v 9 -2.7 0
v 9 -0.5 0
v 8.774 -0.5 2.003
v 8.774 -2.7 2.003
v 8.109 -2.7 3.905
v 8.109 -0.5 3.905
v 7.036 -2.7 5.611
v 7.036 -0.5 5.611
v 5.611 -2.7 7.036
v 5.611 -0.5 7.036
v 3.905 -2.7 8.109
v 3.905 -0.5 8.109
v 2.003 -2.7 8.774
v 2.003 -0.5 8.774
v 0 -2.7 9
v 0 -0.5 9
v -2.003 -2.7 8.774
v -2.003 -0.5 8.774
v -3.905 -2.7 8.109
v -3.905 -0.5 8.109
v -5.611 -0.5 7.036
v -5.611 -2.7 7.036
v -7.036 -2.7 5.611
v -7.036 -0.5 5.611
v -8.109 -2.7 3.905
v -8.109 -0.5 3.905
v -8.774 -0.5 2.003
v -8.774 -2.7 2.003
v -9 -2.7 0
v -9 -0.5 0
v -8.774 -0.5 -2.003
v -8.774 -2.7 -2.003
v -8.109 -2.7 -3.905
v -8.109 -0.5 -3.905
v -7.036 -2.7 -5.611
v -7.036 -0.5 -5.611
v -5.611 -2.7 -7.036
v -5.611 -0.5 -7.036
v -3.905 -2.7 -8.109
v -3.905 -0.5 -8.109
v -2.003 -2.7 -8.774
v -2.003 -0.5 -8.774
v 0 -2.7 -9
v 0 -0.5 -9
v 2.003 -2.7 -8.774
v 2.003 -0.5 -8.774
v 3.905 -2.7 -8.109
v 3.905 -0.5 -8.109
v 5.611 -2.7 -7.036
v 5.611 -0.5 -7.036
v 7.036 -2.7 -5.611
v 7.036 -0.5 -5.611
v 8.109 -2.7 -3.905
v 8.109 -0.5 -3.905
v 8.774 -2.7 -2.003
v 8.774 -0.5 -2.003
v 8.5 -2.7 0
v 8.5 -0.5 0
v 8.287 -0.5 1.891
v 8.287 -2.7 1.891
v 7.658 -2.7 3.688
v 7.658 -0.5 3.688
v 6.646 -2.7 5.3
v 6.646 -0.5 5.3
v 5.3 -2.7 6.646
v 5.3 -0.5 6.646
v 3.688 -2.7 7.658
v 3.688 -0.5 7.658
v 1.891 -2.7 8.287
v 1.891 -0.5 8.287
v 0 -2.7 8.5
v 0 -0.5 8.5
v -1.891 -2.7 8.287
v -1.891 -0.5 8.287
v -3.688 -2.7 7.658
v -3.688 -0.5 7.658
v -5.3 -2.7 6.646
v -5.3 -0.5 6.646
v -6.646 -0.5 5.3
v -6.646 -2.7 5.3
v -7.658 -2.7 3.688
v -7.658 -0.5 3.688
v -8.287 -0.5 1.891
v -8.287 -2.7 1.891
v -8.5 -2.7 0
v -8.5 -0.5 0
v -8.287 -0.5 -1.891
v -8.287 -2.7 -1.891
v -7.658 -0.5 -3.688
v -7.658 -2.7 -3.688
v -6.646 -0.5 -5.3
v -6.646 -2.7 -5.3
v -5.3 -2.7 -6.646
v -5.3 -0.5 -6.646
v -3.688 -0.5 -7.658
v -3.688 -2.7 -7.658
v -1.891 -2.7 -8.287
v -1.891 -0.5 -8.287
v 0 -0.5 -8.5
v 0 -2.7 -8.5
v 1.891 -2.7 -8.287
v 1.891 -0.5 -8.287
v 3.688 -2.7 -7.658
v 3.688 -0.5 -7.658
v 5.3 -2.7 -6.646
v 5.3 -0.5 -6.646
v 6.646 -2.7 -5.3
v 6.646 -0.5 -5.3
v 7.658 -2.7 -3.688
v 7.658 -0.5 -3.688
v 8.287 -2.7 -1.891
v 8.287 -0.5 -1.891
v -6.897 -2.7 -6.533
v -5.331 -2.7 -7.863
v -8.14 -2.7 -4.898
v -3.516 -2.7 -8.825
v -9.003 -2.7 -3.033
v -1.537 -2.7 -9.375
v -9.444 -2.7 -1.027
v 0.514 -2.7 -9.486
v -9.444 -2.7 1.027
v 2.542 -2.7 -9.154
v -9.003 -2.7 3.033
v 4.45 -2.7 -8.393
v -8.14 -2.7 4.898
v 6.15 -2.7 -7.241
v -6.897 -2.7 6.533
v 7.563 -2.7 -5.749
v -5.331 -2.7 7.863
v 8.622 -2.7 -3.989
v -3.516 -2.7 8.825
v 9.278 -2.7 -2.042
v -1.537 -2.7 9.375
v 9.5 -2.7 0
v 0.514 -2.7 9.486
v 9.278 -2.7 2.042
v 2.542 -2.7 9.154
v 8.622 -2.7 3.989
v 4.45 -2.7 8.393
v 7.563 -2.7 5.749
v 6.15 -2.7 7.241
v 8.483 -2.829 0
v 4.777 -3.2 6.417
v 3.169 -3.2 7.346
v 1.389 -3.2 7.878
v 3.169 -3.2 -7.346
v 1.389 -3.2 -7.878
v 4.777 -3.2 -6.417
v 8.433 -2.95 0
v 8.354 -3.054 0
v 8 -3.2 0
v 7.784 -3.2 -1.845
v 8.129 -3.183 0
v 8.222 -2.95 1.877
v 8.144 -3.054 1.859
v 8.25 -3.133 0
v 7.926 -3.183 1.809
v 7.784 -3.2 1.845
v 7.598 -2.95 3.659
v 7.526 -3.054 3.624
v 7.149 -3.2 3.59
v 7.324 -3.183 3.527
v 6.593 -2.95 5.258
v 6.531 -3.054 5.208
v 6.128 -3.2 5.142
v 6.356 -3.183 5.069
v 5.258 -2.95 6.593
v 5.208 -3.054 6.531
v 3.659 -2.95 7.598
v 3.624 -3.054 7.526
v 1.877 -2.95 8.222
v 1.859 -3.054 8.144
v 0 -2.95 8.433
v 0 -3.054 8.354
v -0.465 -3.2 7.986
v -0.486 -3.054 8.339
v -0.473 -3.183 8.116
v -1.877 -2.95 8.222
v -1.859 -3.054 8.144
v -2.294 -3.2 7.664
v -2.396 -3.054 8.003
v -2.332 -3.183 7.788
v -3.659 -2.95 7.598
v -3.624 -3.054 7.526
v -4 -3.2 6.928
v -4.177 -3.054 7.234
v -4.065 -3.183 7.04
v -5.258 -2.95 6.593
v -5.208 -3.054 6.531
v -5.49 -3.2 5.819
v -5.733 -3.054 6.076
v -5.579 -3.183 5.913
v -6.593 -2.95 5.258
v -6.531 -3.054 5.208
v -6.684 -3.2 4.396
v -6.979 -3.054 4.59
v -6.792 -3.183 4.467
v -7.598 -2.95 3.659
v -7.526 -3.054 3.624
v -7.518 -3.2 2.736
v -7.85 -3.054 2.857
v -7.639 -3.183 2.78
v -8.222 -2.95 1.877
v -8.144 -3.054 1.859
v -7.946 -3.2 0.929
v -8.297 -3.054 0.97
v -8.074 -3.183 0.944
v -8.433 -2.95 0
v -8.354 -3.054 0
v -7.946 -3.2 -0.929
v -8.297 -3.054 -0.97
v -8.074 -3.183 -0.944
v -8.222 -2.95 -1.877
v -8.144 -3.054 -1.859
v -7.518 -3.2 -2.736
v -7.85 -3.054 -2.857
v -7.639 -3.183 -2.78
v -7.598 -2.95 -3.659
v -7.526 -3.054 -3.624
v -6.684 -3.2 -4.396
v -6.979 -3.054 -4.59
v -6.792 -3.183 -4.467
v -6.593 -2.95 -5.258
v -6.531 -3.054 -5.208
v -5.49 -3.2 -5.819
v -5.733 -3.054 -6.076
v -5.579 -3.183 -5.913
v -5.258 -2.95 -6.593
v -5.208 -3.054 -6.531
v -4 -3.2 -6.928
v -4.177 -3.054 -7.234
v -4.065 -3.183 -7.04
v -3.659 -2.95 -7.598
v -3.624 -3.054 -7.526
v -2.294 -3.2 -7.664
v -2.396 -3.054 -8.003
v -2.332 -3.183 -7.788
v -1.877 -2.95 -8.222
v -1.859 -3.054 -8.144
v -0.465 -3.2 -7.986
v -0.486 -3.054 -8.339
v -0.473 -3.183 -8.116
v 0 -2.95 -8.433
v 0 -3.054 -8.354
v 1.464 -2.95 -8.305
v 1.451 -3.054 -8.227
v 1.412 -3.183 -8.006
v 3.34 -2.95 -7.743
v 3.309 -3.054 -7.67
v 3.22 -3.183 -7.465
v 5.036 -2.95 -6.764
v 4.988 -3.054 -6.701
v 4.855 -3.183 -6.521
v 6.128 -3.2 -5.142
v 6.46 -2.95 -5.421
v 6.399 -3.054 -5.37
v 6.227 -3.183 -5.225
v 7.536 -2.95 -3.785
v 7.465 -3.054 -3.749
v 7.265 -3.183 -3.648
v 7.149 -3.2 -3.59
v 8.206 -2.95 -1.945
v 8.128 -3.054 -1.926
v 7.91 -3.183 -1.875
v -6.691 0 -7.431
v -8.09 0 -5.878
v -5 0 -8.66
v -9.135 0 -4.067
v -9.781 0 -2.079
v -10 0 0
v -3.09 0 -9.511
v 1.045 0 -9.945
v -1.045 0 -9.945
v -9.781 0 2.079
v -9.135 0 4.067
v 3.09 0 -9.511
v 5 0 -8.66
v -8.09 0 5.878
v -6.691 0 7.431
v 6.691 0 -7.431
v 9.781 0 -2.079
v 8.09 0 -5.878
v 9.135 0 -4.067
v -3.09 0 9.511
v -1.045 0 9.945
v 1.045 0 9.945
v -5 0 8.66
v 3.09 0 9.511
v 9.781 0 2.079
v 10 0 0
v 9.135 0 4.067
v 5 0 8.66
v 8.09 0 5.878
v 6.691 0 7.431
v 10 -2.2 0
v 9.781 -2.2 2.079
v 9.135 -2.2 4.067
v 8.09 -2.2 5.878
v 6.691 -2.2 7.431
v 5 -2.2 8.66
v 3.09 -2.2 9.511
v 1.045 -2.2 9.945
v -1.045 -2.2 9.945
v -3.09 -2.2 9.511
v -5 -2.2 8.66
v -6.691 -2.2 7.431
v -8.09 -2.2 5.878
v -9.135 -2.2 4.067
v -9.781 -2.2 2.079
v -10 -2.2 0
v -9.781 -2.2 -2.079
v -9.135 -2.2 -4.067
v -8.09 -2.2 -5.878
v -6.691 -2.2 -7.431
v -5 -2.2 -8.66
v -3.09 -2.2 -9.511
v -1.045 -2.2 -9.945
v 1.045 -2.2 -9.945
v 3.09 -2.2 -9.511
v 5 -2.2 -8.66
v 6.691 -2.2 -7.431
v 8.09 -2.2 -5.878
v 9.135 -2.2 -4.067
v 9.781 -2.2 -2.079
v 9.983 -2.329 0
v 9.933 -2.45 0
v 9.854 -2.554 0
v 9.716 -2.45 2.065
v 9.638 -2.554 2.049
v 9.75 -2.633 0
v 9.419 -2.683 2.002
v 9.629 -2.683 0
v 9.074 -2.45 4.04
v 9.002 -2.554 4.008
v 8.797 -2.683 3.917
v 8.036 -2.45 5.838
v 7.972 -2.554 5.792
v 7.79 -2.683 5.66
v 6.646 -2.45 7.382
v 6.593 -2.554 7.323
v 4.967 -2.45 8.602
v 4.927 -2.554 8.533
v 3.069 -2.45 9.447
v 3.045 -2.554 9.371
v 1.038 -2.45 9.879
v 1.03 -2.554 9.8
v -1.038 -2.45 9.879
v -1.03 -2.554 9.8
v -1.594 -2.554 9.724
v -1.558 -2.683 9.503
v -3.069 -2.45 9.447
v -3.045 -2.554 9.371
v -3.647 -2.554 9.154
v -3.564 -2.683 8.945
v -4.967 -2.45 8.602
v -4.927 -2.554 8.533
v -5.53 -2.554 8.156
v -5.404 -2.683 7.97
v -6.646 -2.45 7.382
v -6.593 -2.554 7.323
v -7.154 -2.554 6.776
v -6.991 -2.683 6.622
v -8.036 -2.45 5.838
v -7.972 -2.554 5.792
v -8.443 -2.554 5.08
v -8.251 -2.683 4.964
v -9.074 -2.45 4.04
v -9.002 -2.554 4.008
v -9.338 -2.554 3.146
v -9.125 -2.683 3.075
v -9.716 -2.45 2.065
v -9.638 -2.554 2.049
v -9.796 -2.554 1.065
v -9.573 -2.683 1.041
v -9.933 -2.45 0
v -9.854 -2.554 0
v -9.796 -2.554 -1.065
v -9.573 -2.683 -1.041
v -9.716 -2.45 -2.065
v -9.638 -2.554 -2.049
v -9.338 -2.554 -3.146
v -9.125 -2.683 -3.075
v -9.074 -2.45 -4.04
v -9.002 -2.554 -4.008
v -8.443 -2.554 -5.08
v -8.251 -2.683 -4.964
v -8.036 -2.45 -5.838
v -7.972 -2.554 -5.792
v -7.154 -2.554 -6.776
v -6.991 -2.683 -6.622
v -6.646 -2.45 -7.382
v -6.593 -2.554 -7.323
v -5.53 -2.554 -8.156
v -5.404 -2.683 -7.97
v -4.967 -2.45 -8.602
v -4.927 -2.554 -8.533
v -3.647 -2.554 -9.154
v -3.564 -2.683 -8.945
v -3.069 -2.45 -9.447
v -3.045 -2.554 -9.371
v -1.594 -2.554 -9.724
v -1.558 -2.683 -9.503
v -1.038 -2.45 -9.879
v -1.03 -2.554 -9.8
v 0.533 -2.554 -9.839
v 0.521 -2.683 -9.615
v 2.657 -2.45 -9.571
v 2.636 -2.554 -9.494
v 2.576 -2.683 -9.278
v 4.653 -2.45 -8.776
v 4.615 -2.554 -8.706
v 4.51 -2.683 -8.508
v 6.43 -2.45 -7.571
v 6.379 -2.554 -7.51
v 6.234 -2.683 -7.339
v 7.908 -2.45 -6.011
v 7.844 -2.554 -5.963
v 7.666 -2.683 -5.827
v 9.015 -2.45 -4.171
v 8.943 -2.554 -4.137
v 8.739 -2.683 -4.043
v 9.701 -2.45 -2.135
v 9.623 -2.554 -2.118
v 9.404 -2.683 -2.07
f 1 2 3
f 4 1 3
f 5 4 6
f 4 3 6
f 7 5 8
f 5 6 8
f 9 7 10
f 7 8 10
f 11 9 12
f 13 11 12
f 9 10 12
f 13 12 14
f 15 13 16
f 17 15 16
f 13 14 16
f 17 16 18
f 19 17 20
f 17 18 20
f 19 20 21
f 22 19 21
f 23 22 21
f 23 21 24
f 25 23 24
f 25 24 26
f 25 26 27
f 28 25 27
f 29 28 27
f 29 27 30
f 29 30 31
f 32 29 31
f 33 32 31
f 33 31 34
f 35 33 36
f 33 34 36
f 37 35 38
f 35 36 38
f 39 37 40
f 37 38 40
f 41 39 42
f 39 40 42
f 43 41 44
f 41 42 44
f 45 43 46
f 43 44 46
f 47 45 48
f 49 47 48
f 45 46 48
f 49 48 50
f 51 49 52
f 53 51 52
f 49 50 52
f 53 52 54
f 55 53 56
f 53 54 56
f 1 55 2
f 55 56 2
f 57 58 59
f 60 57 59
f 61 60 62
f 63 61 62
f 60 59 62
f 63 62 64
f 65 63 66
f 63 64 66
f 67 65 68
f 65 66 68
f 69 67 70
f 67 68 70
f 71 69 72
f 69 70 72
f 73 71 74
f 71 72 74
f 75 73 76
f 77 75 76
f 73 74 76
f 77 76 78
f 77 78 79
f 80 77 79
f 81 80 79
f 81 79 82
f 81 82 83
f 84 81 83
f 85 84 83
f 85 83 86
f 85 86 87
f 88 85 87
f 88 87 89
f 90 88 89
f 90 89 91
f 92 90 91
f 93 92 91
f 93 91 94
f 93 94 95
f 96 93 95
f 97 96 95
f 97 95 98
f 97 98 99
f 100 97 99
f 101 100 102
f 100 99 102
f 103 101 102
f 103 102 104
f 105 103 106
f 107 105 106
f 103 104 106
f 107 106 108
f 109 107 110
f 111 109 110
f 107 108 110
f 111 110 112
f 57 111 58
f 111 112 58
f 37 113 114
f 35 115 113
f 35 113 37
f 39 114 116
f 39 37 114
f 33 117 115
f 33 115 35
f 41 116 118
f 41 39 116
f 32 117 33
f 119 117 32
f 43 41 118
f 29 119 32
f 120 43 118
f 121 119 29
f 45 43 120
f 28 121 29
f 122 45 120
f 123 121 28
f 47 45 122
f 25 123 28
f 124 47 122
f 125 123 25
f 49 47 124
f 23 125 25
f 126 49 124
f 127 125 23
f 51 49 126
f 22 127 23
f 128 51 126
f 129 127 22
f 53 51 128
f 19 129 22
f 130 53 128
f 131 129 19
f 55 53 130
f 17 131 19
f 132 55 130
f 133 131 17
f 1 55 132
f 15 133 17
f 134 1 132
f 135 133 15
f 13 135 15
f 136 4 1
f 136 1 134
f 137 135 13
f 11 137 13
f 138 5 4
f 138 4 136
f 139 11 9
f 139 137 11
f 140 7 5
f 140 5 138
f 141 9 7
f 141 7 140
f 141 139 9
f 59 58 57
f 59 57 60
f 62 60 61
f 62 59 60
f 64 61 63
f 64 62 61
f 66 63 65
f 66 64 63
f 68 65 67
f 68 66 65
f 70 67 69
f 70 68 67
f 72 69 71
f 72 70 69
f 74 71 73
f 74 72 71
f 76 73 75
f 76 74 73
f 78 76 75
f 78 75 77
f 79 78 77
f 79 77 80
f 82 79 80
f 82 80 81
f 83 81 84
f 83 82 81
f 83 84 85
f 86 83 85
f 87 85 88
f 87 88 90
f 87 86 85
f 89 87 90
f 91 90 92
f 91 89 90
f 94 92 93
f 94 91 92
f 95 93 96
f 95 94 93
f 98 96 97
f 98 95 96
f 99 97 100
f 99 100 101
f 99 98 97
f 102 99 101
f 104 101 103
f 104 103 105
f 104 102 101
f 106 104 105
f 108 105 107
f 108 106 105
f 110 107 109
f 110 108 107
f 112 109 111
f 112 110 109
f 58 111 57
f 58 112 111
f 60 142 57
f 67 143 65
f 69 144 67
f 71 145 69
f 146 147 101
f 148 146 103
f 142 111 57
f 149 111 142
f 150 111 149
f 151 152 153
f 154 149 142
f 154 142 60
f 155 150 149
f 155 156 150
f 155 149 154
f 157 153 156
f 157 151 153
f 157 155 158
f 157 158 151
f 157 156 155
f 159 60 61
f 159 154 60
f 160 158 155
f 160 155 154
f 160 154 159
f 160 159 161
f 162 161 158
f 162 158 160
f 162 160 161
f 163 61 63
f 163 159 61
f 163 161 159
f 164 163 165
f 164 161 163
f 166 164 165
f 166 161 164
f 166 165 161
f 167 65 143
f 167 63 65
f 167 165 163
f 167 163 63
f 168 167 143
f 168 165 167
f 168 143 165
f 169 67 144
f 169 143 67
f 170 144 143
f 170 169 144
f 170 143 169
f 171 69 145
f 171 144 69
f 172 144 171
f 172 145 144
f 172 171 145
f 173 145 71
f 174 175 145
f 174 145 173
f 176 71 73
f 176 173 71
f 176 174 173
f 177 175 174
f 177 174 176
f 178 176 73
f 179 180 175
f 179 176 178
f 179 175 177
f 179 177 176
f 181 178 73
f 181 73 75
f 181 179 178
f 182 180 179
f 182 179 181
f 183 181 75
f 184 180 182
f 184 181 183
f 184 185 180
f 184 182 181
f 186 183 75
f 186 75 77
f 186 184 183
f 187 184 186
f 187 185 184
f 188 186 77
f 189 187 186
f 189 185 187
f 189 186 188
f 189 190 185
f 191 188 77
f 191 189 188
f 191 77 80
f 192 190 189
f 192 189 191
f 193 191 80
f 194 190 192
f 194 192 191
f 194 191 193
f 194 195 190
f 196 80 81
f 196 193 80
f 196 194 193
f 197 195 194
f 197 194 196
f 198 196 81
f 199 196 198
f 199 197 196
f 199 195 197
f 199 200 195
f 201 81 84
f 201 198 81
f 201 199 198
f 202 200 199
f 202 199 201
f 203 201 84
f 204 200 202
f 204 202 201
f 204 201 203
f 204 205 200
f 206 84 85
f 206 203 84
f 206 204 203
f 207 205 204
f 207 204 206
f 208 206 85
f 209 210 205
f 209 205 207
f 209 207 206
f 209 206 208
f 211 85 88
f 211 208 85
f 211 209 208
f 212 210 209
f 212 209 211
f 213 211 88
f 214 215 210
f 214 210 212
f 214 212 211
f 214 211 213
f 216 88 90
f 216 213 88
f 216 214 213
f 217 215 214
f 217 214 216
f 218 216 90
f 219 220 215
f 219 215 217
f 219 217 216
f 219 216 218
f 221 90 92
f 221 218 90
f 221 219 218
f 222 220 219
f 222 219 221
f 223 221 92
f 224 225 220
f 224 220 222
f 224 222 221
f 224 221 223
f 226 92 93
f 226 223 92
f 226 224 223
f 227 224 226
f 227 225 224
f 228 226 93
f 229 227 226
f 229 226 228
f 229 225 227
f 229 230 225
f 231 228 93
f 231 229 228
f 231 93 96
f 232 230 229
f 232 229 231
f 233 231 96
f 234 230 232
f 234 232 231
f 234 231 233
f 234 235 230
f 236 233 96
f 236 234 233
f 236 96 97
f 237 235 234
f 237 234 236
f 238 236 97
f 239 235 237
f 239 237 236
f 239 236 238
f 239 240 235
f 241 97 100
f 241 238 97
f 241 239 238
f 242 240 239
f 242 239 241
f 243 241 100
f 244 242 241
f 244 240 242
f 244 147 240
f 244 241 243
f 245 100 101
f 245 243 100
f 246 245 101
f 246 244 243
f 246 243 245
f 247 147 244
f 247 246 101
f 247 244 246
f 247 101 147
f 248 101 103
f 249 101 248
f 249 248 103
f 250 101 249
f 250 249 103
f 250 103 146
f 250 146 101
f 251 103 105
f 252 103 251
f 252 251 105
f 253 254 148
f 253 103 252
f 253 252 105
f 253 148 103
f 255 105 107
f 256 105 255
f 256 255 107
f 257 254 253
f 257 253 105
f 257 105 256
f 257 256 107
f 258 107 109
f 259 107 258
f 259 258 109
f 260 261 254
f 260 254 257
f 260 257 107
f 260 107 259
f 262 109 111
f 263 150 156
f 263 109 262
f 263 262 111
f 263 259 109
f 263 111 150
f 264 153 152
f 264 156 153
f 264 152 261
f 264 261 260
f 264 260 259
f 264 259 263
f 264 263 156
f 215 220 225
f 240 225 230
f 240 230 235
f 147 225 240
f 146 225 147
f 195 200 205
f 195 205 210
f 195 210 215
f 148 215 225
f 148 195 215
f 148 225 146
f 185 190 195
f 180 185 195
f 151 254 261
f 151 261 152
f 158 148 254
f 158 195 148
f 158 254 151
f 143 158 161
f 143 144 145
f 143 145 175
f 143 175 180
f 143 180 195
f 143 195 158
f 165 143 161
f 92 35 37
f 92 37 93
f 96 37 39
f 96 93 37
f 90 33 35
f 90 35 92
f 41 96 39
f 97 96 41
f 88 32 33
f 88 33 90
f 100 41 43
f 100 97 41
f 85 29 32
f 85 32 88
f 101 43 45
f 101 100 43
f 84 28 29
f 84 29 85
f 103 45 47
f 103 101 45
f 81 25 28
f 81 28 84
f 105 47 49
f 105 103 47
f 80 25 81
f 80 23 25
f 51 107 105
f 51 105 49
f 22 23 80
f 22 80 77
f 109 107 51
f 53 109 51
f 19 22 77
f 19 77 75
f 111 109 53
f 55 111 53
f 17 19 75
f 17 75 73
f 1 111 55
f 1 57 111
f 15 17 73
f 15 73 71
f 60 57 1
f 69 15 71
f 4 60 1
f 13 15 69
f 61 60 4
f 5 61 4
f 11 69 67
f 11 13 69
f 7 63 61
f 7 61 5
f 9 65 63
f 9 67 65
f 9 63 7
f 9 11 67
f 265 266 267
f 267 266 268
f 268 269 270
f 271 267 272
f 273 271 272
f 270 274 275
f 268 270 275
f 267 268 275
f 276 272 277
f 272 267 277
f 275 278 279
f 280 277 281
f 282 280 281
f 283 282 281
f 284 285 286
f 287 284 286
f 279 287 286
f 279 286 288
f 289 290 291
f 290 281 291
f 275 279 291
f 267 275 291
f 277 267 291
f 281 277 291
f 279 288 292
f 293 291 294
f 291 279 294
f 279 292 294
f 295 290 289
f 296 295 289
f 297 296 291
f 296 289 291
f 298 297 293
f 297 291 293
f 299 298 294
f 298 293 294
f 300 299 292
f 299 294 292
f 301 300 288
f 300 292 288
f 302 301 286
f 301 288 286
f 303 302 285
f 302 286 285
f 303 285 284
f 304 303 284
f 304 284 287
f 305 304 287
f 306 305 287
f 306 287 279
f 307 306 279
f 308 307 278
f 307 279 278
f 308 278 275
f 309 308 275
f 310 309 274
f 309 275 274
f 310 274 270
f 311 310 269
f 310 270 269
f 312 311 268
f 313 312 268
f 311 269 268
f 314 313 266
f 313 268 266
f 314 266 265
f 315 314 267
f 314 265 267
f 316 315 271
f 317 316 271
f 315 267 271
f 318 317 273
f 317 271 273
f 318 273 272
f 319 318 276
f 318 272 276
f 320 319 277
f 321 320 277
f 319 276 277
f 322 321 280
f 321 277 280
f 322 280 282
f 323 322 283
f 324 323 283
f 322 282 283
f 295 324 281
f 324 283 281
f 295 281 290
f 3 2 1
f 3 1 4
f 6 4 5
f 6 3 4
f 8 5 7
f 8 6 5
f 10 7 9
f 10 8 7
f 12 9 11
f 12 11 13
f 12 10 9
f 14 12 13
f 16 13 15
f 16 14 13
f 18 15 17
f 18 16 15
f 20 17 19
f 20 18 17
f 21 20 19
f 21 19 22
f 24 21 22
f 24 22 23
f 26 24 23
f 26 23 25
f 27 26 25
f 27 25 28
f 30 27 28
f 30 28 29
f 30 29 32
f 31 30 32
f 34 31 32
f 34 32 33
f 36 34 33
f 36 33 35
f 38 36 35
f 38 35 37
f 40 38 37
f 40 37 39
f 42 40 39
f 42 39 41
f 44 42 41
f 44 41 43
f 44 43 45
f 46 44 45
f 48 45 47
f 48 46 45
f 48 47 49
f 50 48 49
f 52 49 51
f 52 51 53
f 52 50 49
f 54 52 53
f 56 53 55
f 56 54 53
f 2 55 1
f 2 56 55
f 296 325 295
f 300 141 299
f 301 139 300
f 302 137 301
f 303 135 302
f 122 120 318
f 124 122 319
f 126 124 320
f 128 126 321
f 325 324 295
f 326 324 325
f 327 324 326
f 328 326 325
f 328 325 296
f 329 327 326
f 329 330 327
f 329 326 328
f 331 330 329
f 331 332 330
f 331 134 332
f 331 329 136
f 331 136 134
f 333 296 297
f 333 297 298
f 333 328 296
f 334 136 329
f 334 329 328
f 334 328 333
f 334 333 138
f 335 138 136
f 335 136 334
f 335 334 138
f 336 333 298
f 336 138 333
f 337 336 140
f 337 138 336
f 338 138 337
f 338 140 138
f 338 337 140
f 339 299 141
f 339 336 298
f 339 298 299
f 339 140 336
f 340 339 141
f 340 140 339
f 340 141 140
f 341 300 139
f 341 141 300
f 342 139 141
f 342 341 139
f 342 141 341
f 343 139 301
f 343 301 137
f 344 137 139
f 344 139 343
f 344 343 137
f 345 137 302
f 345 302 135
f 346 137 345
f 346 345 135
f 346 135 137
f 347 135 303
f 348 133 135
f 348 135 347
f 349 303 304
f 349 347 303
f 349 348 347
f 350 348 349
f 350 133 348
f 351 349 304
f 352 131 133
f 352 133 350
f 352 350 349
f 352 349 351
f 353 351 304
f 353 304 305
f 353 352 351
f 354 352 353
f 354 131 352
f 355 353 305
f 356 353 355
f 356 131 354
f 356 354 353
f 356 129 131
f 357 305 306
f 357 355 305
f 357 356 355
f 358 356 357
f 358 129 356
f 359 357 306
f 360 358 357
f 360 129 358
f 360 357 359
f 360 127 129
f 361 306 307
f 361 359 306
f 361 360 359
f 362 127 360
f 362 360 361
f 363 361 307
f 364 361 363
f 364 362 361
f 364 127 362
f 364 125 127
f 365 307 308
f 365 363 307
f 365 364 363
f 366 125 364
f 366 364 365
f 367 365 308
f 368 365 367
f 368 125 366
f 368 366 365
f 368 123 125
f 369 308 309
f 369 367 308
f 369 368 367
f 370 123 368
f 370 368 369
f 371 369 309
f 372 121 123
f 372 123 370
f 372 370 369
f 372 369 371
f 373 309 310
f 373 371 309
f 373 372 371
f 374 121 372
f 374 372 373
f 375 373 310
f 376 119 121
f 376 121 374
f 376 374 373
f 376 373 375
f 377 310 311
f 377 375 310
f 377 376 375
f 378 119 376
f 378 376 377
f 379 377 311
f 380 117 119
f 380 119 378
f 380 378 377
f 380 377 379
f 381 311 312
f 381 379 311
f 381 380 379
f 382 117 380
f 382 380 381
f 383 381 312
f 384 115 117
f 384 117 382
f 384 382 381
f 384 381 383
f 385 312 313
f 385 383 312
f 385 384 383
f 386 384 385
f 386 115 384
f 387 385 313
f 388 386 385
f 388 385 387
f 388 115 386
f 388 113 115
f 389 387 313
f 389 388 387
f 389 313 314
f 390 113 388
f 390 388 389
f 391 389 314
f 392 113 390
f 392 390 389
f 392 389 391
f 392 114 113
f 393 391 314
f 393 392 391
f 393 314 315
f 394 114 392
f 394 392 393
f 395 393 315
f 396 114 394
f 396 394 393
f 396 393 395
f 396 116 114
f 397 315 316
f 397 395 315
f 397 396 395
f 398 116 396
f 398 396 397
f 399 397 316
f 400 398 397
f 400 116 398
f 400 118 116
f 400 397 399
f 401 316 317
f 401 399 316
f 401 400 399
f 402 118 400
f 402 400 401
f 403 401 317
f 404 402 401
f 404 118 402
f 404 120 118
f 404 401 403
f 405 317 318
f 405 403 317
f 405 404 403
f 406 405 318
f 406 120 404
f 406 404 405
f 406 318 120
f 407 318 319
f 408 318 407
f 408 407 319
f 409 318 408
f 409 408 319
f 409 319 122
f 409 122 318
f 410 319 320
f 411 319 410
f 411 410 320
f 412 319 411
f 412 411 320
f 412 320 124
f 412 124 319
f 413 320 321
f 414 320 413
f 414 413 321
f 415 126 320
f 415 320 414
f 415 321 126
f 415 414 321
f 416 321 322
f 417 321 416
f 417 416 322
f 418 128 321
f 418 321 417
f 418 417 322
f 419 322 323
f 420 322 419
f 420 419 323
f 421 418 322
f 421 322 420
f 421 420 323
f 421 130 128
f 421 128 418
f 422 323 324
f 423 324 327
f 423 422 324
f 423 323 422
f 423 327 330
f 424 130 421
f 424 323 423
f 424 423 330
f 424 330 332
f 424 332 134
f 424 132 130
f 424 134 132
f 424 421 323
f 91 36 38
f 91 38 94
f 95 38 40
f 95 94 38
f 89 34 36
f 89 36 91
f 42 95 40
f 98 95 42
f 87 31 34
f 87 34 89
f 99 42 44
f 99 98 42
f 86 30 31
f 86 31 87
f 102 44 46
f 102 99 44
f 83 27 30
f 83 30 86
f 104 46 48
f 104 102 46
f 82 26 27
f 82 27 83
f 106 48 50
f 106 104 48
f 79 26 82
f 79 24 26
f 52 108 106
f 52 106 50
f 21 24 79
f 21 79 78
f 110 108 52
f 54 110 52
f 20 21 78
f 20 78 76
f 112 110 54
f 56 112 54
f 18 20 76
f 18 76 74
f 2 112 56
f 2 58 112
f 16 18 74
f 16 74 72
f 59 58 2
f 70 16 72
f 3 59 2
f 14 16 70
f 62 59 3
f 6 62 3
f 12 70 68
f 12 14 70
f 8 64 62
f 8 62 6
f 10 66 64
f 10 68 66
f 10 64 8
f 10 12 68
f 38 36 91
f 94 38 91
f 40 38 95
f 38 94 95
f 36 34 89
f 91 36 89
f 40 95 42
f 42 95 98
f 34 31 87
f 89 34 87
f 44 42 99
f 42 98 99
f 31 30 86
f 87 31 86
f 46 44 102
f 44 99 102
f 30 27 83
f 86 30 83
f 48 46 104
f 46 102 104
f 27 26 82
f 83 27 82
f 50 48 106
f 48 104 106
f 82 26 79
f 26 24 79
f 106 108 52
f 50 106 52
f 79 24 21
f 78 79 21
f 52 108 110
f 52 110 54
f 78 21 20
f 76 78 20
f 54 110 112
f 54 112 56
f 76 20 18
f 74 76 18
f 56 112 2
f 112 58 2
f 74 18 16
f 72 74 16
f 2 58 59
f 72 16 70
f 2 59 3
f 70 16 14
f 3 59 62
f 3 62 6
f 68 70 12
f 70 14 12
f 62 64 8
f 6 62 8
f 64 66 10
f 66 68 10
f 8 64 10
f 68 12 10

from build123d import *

# Parameters (mm, degrees)
F0_R     = 8.5
F1_DEPTH = 3.2
F0_R_2   = 9
F2_DEPTH = 2.2
F0_R_3   = 10
F3_DEPTH = 2.7
F4_R     = 0.5
F5_R     = 0.5
F7_DEPTH = 0.5
F9_DEPTH = 0.5


# Not quite as in the source:
# - a feature names something its author has since deleted; it is built from what else it names


with BuildPart() as f1:
    # F0 (on Front) → F1 (new body)
    with BuildSketch(Plane.XZ):
        Circle(F0_R)
    extrude(amount=F1_DEPTH)

    # F5
    f5_edges = [f1.edges().sort_by_distance(p)[0] for p in [
        (-8.5, -3.2, 0),
    ]]
    fillet(f5_edges, radius=F5_R)



with BuildPart() as f2:
    # F0 (on Front) → F2 (new body)
    with BuildSketch(Plane.XZ):
        Circle(F0_R_2)
        Circle(F0_R, mode=Mode.SUBTRACT)
    extrude(amount=F2_DEPTH)


with BuildPart() as f3:
    # F0 (on Front) → F3 (new body)
    with BuildSketch(Plane.XZ):
        Circle(F0_R_3)
        Circle(F0_R_2, mode=Mode.SUBTRACT)
    extrude(amount=F3_DEPTH)

    # F4
    f4_edges = [f3.edges().sort_by_distance(p)[0] for p in [
        (-10, -2.7, 0),
    ]]
    fillet(f4_edges, radius=F4_R)


with BuildPart() as f2_1:
    # F6: moved
    add(f2.part.moved(Location((0, -0.5, 0))))


with BuildPart() as f7:
    # F7 (new): a face of the model
    f7_faces = [f3.part.faces().sort_by_distance(p)[0] for p in [
        (-9.2312994231, -2.7, 0),
    ]]
    extrude(f7_faces, amount=F7_DEPTH)


with BuildPart() as f1_1:
    add(f1.part)

    add(f3.part)  # F9 merges F3
    # F0 (on Front) → F9 (join)
    with BuildSketch(Plane.XZ):
        Circle(F0_R_2)
        Circle(F0_R, mode=Mode.SUBTRACT)
    extrude(amount=F9_DEPTH)


solid = Compound([f2_1.part, f1_1.part])
